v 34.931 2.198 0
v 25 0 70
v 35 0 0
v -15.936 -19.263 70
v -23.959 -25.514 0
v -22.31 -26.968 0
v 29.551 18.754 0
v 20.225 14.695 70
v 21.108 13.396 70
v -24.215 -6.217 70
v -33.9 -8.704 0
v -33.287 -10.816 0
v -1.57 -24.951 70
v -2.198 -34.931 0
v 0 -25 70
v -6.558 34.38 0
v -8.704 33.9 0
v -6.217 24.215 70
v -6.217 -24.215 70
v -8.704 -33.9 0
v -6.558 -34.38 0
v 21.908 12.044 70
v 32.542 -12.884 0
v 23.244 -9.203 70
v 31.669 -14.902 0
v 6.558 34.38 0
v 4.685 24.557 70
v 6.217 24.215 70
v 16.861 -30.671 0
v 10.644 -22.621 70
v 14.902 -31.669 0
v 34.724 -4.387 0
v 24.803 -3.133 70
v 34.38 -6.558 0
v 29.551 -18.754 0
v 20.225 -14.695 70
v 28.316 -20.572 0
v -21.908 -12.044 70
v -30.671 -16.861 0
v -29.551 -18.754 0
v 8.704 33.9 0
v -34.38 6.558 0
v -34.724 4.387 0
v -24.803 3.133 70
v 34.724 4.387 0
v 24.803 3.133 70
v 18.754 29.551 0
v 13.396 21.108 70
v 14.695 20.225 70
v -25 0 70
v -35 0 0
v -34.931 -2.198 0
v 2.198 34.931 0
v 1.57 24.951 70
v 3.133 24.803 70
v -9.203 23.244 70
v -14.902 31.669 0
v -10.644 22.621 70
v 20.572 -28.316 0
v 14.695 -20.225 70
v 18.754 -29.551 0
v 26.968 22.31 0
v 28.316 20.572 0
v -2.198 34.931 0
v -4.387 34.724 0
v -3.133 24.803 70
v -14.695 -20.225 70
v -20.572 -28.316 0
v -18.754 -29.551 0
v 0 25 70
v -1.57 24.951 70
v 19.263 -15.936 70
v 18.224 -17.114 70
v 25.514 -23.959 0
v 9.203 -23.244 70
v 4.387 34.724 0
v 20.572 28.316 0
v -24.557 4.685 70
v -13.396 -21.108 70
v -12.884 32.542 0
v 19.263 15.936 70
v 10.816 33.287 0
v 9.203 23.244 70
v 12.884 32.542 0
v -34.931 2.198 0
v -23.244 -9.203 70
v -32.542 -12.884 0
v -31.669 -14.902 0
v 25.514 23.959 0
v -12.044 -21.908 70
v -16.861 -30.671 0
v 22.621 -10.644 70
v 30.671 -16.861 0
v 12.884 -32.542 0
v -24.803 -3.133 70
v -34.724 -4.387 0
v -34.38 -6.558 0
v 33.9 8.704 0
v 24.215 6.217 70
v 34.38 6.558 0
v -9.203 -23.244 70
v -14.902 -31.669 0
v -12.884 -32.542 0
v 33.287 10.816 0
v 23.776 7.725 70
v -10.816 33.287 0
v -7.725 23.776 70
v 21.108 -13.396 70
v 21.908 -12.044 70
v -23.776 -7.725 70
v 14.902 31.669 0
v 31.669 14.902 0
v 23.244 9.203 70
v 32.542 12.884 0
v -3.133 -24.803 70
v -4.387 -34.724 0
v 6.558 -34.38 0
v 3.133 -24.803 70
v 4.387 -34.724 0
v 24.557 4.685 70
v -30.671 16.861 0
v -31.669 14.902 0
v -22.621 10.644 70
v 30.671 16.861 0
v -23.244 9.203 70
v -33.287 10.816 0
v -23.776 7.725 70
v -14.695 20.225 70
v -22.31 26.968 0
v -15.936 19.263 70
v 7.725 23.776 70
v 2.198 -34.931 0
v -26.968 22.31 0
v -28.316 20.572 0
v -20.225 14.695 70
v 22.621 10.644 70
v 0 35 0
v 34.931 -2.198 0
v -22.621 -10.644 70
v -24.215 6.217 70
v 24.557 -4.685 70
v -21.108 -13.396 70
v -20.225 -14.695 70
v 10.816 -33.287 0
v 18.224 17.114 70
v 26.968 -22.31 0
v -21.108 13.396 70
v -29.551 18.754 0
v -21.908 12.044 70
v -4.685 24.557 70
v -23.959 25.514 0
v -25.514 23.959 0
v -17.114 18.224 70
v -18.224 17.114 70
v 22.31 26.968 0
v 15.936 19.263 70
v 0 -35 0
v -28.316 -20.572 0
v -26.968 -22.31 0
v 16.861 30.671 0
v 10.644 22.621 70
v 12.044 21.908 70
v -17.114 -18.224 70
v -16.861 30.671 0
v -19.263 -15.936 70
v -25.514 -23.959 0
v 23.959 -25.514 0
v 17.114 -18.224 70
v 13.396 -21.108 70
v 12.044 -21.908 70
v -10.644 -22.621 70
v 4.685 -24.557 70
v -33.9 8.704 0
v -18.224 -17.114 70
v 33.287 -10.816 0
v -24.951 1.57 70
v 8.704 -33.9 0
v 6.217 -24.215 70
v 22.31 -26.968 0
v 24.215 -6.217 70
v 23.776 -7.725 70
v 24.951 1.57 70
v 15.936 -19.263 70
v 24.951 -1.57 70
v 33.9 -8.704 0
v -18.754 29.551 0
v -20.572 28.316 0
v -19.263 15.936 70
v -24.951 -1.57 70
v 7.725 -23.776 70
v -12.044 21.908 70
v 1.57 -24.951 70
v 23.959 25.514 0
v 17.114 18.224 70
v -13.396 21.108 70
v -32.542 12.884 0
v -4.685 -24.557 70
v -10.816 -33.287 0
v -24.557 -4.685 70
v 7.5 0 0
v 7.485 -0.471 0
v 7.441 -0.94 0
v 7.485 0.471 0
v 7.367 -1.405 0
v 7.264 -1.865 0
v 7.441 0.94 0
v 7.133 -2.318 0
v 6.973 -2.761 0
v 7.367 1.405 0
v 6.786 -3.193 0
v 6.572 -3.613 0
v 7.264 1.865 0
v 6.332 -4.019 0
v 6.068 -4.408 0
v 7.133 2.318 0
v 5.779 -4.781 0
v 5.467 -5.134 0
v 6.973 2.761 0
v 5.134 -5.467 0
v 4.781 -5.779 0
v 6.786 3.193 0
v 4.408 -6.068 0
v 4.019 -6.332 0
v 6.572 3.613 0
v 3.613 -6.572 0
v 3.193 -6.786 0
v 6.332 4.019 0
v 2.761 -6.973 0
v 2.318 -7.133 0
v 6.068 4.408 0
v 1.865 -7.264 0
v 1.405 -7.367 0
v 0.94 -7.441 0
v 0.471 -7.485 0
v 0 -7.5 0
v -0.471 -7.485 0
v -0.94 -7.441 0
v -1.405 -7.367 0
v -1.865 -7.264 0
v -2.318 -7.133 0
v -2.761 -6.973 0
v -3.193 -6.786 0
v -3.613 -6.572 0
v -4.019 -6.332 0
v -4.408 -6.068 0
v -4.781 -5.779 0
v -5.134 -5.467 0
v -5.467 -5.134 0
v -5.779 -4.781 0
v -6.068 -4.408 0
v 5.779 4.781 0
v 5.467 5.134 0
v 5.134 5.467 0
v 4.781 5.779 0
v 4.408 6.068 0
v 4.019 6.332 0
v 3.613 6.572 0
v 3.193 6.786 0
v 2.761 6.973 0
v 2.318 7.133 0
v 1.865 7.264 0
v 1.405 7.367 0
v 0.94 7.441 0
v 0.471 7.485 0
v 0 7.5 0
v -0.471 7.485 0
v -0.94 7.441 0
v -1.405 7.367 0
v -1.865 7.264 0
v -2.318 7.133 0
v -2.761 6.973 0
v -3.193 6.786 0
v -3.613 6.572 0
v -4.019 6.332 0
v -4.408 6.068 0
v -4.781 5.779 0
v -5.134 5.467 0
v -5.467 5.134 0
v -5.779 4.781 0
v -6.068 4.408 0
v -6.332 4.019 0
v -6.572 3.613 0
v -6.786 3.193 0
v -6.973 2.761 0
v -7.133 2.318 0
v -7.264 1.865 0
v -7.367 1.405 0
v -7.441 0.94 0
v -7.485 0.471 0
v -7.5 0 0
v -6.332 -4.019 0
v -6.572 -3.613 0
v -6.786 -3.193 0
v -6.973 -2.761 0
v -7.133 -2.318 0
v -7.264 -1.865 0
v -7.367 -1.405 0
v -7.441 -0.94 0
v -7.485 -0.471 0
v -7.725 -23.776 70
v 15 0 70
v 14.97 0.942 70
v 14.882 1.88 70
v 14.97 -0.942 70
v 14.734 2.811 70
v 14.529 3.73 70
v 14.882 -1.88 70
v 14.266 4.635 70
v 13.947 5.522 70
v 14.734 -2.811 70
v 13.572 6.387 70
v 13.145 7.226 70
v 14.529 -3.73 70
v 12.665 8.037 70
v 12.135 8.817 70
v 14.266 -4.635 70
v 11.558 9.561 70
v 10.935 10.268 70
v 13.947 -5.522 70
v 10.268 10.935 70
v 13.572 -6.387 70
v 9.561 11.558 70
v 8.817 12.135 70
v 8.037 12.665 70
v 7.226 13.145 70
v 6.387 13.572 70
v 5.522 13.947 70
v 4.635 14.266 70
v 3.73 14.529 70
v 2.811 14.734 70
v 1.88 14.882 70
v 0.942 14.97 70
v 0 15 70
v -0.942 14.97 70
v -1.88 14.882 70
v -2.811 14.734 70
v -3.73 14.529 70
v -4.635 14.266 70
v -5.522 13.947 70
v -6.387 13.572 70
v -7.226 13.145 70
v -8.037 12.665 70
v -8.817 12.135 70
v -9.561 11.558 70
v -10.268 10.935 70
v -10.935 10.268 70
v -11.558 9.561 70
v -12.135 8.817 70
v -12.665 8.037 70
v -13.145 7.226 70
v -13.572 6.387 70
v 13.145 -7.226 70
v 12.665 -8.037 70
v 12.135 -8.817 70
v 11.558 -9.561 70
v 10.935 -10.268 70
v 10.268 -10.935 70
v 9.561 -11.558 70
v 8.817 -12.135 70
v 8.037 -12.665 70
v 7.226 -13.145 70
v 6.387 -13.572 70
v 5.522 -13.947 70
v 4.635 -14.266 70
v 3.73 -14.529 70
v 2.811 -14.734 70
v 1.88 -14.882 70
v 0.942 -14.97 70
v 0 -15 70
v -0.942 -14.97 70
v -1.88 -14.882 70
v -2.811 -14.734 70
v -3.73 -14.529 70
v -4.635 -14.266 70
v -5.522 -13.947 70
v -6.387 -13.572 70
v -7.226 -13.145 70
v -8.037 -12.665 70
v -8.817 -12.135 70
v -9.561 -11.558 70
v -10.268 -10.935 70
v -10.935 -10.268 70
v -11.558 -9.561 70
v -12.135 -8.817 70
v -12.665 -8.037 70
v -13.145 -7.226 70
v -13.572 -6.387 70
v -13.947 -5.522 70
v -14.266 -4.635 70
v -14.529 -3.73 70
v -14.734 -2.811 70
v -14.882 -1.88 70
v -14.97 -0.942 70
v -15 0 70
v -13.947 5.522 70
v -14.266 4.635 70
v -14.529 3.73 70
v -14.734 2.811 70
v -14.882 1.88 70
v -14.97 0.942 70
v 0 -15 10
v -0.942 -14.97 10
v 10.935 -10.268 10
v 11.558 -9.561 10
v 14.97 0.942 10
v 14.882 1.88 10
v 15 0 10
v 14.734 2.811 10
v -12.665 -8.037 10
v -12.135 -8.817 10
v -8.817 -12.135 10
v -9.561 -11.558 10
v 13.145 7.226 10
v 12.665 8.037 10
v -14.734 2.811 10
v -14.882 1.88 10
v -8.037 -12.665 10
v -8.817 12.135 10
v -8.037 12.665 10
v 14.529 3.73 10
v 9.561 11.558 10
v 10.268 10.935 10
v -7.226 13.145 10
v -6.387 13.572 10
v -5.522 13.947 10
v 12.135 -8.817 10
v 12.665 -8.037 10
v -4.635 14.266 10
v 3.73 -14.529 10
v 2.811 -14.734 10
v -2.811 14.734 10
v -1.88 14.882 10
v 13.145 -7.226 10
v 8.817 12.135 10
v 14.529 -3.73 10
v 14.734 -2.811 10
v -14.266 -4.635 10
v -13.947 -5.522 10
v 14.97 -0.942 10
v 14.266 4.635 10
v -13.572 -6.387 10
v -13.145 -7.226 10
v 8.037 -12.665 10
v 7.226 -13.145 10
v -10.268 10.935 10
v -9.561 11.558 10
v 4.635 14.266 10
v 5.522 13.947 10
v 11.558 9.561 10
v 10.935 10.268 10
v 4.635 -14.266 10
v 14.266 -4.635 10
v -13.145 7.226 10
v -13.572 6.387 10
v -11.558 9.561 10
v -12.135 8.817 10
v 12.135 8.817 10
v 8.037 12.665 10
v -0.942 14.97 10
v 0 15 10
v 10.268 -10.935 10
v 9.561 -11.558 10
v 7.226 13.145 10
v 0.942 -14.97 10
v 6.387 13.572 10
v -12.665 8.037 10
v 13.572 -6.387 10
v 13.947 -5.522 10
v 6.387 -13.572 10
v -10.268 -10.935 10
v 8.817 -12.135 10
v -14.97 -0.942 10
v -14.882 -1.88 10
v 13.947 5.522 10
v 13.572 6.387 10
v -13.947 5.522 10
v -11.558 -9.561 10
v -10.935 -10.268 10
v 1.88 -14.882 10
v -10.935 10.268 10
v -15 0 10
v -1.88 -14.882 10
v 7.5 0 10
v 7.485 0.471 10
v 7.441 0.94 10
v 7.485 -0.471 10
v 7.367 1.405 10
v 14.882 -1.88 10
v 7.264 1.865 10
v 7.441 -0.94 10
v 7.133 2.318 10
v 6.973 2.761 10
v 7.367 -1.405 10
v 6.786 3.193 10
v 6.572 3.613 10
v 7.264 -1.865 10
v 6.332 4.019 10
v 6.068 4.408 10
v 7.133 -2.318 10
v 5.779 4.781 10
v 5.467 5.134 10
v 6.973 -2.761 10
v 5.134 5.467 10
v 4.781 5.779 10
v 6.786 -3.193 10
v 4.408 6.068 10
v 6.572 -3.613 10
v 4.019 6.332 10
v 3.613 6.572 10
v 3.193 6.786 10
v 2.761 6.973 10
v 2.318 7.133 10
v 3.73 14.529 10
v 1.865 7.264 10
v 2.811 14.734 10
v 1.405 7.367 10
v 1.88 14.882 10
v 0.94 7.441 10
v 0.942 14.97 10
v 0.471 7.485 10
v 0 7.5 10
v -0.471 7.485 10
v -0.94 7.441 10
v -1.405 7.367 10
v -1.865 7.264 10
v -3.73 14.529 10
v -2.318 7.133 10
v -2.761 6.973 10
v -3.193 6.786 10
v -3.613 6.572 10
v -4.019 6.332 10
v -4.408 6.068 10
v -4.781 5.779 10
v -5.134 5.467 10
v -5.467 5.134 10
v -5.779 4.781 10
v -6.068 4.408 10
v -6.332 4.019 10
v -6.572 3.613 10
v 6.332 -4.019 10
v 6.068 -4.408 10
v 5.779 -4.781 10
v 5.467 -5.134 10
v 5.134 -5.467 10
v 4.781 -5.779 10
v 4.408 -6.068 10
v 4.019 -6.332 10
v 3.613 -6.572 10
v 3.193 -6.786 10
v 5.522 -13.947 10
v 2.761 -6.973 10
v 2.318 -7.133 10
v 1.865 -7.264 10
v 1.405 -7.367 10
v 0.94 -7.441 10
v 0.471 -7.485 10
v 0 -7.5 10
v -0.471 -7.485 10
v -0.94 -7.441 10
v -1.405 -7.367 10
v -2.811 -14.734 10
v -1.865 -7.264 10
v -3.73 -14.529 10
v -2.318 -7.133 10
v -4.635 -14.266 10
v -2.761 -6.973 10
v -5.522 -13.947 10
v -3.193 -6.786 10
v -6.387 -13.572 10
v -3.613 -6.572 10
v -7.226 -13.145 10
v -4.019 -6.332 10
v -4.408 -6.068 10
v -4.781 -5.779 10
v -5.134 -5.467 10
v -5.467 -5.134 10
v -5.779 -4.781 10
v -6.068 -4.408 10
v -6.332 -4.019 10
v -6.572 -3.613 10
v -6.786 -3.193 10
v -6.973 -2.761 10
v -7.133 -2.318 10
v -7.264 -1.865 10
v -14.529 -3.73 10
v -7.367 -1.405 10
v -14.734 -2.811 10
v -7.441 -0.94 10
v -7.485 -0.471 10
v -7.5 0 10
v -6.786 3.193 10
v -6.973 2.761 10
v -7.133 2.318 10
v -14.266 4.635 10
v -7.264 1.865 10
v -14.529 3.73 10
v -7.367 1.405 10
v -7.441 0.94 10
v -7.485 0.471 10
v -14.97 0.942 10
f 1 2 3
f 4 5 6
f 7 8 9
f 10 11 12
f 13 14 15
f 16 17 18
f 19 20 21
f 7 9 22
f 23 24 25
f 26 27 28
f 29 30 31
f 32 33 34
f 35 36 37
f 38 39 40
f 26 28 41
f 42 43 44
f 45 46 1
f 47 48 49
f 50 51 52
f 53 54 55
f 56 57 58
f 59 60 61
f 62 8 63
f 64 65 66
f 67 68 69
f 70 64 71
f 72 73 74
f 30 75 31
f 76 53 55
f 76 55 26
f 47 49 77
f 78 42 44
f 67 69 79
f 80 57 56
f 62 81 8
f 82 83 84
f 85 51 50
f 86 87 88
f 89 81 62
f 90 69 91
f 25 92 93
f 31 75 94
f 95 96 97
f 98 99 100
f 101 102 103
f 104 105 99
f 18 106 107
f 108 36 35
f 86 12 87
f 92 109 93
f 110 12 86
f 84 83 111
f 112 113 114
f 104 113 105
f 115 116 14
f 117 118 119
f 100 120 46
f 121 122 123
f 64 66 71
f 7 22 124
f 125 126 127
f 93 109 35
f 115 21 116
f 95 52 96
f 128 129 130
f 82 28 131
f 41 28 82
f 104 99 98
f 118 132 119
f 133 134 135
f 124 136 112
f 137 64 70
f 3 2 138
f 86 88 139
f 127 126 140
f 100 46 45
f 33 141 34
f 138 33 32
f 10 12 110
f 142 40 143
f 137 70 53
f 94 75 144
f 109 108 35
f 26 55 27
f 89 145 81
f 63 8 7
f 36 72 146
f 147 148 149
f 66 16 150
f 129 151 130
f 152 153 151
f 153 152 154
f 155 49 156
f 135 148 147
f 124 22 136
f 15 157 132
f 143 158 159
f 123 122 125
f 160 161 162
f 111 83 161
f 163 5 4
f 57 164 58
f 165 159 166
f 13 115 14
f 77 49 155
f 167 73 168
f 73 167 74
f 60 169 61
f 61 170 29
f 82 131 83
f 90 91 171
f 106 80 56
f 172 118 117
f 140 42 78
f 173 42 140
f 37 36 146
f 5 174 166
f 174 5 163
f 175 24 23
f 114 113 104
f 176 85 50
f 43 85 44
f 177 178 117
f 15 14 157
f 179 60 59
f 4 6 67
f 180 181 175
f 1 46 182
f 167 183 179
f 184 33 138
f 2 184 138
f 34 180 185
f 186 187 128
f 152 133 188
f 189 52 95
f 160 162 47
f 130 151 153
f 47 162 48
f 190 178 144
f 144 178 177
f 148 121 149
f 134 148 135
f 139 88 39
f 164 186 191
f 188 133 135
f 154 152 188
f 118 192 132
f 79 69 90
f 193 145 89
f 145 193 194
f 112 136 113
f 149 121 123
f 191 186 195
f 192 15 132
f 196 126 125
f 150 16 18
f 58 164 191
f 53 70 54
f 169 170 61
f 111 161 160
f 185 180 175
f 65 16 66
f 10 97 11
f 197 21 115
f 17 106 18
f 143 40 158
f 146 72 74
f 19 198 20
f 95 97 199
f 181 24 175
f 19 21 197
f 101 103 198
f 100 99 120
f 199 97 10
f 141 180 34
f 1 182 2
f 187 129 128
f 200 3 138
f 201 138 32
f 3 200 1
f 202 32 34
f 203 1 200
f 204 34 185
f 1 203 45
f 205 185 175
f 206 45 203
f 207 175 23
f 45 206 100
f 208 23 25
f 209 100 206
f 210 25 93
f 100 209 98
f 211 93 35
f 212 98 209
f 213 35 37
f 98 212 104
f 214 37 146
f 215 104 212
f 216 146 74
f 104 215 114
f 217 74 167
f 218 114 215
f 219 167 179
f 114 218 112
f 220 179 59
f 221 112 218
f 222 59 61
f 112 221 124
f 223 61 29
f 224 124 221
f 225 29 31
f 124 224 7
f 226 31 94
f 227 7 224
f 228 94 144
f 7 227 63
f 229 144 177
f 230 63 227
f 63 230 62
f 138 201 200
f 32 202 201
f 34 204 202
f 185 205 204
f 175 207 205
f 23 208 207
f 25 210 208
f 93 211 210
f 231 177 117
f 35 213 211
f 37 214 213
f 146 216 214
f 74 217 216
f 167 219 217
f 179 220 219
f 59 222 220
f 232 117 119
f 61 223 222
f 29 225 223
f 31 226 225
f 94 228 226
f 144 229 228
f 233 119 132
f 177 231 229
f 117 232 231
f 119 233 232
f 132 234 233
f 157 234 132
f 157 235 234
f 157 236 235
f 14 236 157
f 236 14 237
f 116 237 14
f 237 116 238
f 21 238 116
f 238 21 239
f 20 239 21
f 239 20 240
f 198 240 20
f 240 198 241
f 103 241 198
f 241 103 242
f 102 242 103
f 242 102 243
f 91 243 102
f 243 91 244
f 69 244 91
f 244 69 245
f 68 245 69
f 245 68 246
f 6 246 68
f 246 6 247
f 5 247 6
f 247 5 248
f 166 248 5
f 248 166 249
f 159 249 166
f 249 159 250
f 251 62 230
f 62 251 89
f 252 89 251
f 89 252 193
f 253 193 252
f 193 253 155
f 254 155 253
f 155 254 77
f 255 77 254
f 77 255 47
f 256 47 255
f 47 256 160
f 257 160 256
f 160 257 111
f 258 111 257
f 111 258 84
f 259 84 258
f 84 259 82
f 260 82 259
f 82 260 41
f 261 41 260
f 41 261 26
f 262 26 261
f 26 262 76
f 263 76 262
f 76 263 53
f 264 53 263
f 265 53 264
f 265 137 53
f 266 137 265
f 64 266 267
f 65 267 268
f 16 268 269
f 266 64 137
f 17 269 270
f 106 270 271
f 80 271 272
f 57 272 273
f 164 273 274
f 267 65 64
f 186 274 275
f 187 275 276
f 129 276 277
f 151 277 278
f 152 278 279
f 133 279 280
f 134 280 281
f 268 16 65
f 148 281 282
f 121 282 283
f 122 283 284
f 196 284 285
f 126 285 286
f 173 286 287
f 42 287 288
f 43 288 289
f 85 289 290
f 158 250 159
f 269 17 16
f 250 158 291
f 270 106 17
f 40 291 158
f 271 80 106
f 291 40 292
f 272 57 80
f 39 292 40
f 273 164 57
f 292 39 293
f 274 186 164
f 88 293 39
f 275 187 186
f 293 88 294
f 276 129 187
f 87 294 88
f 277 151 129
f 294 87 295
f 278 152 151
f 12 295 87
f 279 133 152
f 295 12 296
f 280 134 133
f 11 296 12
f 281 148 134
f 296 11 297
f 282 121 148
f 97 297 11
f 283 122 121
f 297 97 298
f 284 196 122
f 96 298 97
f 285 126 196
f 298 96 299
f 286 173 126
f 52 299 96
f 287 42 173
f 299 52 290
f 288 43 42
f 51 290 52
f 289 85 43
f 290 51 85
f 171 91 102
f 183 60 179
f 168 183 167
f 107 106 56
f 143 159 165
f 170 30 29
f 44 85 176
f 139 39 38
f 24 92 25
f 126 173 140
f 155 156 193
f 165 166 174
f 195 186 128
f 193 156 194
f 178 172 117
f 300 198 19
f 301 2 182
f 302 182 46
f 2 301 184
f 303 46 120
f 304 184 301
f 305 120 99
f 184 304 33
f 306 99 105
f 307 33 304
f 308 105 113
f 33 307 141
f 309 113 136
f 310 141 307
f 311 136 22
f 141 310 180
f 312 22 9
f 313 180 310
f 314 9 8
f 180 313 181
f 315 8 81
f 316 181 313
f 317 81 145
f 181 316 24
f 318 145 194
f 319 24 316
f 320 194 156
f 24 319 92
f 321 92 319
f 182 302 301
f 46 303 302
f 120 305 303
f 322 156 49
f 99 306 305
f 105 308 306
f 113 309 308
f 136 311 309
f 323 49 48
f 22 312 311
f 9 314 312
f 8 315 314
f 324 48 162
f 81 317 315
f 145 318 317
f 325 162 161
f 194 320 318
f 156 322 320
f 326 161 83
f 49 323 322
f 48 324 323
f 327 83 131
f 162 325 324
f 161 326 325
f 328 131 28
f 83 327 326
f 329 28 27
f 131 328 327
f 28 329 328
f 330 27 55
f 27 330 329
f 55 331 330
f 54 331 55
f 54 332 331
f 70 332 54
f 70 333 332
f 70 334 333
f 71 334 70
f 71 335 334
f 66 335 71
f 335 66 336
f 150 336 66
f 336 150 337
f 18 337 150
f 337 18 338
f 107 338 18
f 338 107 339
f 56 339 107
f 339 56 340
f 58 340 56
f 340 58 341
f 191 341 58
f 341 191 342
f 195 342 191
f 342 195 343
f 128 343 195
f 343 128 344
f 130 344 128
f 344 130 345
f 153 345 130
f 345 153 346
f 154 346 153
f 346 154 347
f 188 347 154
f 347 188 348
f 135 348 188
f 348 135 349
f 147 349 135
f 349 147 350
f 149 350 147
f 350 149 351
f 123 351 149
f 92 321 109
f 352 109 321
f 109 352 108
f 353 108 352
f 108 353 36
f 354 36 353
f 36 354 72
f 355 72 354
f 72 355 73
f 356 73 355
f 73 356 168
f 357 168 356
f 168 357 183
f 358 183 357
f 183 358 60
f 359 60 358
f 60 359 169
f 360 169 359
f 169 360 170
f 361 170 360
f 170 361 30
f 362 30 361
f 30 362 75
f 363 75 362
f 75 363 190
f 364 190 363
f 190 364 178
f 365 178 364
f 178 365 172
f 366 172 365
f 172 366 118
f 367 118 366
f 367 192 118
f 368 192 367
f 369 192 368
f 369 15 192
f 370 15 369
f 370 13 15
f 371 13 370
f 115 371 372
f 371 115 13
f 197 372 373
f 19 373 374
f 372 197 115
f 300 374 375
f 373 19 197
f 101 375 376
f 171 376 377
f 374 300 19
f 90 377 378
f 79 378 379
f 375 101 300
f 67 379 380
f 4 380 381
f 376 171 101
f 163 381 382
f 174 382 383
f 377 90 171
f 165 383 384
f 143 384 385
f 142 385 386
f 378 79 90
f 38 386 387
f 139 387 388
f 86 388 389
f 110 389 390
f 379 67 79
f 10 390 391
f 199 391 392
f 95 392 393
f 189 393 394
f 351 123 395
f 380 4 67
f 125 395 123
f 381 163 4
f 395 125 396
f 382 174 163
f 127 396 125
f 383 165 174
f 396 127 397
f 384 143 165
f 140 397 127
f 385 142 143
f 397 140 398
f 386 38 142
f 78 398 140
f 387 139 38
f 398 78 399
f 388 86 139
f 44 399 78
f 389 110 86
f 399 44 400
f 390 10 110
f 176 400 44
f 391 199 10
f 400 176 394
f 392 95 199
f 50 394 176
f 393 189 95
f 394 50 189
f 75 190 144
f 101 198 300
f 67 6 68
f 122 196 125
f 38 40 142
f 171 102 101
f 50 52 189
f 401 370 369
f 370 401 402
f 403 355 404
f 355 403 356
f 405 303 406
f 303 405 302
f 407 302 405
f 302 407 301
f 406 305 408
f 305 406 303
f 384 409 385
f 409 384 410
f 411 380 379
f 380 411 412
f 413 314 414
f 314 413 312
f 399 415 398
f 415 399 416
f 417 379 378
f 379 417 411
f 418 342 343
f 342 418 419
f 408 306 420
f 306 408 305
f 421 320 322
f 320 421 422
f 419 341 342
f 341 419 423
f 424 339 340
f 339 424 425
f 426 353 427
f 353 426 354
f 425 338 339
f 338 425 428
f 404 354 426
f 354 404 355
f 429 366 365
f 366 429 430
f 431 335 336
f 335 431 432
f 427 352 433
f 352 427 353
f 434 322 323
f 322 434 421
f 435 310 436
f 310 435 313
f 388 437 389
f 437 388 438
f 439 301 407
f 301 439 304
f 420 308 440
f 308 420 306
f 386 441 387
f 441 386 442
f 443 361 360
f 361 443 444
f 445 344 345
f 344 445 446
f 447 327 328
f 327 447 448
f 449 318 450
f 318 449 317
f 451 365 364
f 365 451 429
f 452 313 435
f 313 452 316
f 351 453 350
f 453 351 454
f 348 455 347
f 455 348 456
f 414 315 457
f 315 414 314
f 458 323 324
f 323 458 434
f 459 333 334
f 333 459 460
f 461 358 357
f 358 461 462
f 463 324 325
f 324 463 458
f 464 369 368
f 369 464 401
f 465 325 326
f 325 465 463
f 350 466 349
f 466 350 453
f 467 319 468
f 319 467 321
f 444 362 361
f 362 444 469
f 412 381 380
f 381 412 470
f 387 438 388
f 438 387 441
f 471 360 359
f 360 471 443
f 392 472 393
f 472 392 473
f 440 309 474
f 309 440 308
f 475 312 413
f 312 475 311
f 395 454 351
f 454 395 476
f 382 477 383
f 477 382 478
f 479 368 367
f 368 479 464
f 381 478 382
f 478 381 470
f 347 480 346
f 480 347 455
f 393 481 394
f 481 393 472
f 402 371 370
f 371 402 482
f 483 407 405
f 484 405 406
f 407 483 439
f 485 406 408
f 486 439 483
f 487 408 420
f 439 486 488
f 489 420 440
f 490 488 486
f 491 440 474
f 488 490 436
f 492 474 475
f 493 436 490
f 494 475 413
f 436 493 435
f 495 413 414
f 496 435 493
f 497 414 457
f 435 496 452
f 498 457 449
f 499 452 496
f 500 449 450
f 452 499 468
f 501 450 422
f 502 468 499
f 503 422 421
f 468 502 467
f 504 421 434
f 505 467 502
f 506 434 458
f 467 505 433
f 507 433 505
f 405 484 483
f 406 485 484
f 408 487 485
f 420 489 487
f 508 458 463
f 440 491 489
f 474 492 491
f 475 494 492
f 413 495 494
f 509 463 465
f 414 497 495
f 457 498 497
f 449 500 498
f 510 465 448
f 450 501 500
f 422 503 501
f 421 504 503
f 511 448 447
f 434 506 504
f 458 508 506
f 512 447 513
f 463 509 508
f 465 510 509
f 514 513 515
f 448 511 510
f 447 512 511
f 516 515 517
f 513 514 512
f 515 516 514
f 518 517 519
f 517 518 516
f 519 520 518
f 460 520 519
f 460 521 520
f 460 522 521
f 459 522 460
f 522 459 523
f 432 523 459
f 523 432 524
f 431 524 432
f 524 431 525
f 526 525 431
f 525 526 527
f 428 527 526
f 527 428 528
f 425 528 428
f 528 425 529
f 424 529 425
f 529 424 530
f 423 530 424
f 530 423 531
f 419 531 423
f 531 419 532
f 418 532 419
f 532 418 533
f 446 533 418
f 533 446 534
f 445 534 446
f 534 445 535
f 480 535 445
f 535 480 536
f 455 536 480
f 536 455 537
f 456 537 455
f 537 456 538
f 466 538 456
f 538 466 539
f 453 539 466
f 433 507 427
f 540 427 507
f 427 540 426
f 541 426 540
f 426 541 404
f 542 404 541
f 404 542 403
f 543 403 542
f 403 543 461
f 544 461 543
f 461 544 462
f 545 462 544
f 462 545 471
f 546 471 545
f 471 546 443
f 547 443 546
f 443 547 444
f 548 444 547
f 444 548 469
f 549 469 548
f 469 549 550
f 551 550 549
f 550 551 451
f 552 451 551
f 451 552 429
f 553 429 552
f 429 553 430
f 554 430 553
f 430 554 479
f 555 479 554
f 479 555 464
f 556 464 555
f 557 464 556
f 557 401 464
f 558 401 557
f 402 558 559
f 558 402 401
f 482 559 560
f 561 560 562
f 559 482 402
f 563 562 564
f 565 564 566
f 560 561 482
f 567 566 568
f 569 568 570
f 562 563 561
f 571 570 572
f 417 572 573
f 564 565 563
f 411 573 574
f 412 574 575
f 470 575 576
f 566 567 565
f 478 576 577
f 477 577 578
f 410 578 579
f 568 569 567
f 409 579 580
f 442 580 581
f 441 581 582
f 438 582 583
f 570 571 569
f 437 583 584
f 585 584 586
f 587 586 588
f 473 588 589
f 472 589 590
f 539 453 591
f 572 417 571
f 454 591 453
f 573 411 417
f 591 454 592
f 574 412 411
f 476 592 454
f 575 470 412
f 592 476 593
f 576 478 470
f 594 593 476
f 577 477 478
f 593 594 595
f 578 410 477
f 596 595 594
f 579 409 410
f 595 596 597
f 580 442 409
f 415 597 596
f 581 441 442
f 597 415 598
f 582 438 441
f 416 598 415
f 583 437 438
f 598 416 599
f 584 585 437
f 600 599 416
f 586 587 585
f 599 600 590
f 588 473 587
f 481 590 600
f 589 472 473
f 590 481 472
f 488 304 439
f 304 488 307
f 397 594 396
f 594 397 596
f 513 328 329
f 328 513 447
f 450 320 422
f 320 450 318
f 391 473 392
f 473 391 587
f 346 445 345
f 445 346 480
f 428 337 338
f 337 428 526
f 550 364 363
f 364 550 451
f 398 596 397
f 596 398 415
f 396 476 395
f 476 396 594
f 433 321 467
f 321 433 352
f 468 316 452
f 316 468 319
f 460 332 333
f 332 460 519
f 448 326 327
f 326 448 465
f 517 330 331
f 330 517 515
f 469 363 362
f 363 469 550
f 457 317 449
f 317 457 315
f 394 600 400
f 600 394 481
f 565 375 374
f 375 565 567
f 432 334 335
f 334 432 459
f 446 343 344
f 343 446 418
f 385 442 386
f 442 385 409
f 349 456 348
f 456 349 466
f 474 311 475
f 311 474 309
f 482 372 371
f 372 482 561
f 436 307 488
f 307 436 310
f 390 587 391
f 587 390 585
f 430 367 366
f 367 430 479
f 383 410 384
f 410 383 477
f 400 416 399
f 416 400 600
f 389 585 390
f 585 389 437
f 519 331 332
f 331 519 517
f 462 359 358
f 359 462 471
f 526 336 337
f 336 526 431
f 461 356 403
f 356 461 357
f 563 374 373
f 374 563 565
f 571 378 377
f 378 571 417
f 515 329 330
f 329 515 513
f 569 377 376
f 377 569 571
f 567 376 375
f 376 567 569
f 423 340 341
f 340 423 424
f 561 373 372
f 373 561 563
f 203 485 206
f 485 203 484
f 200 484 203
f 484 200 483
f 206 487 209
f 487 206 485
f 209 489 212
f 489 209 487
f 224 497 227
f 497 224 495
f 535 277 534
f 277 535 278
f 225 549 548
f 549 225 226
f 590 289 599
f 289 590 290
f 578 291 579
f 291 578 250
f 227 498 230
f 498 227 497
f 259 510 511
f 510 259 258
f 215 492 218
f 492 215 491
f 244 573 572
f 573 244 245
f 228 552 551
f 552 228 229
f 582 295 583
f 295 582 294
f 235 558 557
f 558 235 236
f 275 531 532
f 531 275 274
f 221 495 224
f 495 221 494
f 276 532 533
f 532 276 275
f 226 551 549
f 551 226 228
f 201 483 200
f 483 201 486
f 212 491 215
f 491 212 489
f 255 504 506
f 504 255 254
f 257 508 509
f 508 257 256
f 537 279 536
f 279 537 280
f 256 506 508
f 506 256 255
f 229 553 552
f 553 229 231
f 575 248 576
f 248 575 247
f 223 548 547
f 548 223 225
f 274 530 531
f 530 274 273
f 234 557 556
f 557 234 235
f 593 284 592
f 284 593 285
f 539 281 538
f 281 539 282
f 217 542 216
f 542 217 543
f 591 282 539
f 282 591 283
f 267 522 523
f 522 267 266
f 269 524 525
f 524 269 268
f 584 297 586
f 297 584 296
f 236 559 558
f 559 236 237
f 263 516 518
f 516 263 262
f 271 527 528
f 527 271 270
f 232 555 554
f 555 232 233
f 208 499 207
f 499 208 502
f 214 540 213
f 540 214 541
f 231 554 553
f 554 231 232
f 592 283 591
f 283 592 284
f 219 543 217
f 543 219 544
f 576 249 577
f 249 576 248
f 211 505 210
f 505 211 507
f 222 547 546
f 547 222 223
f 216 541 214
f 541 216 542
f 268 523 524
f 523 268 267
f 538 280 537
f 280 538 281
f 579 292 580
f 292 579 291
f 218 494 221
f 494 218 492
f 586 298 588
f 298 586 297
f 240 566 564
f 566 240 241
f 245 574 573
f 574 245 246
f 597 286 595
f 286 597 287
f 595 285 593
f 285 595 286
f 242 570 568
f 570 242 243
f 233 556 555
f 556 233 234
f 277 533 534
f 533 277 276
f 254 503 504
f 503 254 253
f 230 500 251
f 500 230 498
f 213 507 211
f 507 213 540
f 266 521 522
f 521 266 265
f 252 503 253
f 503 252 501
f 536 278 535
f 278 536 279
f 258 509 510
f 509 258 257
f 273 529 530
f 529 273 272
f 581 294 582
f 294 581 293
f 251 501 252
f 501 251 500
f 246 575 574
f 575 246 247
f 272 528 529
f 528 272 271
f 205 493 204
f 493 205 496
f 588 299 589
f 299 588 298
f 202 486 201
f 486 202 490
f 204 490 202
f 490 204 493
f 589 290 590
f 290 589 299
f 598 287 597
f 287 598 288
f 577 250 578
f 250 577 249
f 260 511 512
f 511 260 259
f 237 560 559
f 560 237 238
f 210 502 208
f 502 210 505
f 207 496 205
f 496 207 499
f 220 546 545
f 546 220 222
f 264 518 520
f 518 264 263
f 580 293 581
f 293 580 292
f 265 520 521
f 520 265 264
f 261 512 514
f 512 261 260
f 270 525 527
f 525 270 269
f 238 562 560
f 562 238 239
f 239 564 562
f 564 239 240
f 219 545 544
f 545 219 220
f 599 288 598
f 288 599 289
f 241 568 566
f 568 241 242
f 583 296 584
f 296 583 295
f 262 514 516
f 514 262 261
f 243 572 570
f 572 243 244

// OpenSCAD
$fn=100;
TOPOD=50;
BOTTOMOD=70;
HEIGHT=70;
CENTERID=30;
BOTTOMTHICK=10;
BOTTOMHOLEDIA=15;

difference()
{
    difference()
    {
        cylinder(h=HEIGHT,d1=BOTTOMOD,d2=TOPOD);
        translate([0,0,BOTTOMTHICK])
        {
           cylinder(h=HEIGHT,d=CENTERID); 
        } 
    };
    translate([0,0,-1]) 
    {
      cylinder(h=(HEIGHT+1),d=BOTTOMHOLEDIA); 
    }; 
};
